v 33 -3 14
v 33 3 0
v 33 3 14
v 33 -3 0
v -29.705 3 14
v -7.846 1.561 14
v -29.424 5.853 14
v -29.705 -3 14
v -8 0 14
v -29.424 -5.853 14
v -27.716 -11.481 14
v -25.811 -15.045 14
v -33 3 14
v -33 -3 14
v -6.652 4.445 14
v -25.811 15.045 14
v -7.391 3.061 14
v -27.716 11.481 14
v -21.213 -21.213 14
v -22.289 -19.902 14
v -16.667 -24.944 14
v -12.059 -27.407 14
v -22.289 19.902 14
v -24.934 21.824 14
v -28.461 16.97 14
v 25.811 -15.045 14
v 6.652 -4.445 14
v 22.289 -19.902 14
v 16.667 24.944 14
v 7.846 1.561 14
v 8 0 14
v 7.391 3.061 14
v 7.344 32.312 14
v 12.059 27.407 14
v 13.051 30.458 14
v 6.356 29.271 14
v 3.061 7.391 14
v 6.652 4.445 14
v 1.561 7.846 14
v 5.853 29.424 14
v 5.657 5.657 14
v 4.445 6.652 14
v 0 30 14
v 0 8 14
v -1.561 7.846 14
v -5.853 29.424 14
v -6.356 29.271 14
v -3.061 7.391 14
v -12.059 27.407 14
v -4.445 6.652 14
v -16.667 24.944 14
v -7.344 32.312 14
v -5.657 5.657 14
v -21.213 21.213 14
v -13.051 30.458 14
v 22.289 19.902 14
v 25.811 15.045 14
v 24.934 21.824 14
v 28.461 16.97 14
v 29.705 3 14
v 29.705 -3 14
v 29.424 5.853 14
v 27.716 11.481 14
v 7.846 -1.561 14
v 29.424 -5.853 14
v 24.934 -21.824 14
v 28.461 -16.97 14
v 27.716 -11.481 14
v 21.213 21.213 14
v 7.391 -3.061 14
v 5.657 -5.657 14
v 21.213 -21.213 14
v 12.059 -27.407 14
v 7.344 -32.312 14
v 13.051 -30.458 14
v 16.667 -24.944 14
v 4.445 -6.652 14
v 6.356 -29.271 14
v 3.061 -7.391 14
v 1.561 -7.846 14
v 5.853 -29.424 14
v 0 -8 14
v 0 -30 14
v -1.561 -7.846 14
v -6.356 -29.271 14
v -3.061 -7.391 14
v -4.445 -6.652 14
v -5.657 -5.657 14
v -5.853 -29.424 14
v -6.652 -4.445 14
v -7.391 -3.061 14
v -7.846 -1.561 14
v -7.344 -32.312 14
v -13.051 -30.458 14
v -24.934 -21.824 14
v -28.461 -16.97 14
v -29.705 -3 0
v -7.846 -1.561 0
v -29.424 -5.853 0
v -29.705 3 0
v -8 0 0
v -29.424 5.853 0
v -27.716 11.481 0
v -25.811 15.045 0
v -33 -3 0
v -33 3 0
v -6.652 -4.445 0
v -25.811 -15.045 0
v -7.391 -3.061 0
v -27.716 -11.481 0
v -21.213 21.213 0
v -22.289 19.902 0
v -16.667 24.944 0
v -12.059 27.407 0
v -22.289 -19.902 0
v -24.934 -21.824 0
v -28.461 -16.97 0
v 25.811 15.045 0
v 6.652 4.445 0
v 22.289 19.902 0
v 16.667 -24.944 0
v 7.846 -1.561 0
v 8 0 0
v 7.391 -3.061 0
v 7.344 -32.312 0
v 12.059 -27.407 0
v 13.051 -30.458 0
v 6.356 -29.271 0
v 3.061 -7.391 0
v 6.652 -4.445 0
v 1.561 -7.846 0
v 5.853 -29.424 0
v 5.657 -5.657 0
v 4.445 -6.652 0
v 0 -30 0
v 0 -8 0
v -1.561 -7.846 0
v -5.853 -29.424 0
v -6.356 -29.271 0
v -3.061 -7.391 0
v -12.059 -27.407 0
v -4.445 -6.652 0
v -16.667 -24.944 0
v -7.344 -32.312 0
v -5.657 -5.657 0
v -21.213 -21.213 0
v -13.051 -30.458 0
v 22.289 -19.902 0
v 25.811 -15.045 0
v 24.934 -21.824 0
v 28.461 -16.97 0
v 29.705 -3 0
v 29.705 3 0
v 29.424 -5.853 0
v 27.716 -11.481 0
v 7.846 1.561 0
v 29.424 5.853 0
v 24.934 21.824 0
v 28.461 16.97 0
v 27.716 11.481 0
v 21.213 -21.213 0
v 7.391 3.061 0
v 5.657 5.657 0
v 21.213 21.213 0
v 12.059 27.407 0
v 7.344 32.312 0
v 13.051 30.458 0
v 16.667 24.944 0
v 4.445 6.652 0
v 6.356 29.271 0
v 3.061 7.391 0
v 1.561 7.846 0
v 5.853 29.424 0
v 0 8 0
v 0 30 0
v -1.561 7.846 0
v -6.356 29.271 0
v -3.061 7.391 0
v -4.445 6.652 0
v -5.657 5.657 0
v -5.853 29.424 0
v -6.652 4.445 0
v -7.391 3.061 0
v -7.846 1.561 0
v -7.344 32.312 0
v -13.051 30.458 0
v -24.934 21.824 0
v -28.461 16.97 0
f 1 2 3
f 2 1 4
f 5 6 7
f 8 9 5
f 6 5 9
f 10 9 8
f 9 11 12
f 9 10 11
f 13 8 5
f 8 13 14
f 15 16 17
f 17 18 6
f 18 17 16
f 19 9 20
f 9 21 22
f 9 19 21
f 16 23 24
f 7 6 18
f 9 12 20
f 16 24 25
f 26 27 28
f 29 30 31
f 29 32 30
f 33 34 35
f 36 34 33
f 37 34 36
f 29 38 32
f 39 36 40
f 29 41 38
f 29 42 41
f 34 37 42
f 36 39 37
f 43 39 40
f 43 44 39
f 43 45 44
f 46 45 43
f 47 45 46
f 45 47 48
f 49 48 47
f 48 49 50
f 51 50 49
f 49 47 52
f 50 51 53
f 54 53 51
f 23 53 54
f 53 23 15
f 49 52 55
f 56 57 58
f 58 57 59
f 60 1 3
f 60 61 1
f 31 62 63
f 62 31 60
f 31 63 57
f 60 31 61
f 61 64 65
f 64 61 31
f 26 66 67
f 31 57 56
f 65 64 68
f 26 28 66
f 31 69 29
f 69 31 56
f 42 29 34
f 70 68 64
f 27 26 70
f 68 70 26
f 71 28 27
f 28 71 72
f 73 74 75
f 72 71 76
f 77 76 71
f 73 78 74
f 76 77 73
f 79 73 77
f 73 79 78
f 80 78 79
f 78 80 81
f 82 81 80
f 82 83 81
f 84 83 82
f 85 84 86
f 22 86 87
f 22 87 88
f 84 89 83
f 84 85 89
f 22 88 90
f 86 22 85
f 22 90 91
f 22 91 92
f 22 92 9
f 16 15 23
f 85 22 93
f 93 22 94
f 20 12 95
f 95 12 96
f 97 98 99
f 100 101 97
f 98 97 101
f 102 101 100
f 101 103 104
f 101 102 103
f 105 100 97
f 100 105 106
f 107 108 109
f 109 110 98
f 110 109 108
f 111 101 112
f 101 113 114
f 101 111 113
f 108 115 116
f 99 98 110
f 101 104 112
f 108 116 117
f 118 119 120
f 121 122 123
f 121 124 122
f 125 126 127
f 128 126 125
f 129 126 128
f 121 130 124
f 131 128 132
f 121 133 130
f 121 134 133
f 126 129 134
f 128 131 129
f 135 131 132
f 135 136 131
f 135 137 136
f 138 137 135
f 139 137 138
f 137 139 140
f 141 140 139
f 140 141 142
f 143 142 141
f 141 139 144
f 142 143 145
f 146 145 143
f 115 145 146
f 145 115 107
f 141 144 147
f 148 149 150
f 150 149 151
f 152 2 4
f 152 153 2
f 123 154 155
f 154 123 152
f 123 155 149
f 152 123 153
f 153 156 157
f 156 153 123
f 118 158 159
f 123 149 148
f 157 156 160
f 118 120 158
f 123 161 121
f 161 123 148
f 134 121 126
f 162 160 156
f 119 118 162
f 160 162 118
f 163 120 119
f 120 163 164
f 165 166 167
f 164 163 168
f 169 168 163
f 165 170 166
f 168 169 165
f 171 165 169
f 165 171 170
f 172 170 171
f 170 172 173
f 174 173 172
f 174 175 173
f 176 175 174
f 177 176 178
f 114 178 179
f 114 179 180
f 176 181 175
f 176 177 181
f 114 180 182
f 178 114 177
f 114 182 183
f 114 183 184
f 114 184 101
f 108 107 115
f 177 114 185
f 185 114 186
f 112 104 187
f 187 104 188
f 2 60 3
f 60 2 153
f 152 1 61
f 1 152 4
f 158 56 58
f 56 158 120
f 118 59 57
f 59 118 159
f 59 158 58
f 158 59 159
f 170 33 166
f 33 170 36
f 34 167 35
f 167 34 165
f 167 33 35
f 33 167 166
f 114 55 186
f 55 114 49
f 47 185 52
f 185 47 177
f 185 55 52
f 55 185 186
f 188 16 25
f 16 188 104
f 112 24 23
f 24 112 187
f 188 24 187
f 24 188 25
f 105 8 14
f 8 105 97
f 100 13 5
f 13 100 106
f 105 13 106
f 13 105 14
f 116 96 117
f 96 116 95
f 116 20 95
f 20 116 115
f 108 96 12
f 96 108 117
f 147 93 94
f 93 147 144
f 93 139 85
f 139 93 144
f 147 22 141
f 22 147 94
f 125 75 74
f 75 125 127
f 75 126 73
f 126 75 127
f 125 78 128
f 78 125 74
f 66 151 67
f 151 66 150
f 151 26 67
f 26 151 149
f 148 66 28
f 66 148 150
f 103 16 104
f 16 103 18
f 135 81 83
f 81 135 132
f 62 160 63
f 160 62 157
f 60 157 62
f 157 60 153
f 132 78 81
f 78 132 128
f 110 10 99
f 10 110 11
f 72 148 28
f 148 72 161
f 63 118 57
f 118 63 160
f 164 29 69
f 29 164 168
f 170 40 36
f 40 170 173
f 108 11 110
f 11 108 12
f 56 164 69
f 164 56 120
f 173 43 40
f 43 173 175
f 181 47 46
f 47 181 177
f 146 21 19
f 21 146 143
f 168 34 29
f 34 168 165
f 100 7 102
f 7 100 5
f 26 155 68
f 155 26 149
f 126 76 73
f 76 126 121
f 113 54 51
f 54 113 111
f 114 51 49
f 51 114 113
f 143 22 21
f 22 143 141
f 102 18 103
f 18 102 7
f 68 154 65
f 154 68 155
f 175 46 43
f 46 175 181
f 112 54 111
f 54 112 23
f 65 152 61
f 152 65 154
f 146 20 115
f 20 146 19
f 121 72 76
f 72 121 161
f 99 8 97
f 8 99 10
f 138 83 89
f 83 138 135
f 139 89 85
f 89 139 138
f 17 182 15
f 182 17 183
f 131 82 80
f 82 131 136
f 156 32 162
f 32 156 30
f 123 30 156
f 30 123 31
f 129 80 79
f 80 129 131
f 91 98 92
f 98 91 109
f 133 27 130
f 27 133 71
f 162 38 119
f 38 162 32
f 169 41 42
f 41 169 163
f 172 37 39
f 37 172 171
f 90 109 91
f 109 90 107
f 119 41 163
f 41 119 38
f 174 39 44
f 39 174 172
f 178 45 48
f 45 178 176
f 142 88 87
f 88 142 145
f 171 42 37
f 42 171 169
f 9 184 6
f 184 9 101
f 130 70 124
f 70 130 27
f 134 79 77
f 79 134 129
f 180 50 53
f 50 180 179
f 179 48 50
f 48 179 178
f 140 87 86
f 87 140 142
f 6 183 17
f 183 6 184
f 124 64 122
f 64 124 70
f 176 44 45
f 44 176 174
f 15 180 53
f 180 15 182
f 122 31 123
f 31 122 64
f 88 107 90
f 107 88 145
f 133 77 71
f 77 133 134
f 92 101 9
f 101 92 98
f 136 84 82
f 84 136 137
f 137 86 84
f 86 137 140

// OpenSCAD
$fn = 32;

// ----------------------------------------------------------------------
// Spur blank: bored gear blank
// ----------------------------------------------------------------------

// --- parameters (mm) ---
disc_r = 30;              // blank root radius
disc_t = 14;              // blank thickness
n_teeth = 10;             // stub tooth count
tooth_w = 6;              // tooth width at the root
tooth_h = 3;              // tooth height above the root
bore_r = 8;               // central bore radius
fit_tol = 0.02;           // tolerance for press fits, mm
free_tol = 0.2;           // tolerance for clearance fits, mm

out_r = disc_r + tooth_h;  // tip radius
bbox_x = 66.0;  // measured width over the teeth
bbox_y = 64.62;  // measured depth over the teeth

difference() {
union() {
  cylinder(r = disc_r, h = disc_t);
  for (i = [0 : n_teeth - 1])
    rotate([0, 0, i * 360 / n_teeth])
      translate([disc_r - 1, -tooth_w / 2, 0])
        cube([tooth_h + 1, tooth_w, disc_t]);
}
  translate([0, 0, -1]) cylinder(r = bore_r, h = disc_t + 2);
}
